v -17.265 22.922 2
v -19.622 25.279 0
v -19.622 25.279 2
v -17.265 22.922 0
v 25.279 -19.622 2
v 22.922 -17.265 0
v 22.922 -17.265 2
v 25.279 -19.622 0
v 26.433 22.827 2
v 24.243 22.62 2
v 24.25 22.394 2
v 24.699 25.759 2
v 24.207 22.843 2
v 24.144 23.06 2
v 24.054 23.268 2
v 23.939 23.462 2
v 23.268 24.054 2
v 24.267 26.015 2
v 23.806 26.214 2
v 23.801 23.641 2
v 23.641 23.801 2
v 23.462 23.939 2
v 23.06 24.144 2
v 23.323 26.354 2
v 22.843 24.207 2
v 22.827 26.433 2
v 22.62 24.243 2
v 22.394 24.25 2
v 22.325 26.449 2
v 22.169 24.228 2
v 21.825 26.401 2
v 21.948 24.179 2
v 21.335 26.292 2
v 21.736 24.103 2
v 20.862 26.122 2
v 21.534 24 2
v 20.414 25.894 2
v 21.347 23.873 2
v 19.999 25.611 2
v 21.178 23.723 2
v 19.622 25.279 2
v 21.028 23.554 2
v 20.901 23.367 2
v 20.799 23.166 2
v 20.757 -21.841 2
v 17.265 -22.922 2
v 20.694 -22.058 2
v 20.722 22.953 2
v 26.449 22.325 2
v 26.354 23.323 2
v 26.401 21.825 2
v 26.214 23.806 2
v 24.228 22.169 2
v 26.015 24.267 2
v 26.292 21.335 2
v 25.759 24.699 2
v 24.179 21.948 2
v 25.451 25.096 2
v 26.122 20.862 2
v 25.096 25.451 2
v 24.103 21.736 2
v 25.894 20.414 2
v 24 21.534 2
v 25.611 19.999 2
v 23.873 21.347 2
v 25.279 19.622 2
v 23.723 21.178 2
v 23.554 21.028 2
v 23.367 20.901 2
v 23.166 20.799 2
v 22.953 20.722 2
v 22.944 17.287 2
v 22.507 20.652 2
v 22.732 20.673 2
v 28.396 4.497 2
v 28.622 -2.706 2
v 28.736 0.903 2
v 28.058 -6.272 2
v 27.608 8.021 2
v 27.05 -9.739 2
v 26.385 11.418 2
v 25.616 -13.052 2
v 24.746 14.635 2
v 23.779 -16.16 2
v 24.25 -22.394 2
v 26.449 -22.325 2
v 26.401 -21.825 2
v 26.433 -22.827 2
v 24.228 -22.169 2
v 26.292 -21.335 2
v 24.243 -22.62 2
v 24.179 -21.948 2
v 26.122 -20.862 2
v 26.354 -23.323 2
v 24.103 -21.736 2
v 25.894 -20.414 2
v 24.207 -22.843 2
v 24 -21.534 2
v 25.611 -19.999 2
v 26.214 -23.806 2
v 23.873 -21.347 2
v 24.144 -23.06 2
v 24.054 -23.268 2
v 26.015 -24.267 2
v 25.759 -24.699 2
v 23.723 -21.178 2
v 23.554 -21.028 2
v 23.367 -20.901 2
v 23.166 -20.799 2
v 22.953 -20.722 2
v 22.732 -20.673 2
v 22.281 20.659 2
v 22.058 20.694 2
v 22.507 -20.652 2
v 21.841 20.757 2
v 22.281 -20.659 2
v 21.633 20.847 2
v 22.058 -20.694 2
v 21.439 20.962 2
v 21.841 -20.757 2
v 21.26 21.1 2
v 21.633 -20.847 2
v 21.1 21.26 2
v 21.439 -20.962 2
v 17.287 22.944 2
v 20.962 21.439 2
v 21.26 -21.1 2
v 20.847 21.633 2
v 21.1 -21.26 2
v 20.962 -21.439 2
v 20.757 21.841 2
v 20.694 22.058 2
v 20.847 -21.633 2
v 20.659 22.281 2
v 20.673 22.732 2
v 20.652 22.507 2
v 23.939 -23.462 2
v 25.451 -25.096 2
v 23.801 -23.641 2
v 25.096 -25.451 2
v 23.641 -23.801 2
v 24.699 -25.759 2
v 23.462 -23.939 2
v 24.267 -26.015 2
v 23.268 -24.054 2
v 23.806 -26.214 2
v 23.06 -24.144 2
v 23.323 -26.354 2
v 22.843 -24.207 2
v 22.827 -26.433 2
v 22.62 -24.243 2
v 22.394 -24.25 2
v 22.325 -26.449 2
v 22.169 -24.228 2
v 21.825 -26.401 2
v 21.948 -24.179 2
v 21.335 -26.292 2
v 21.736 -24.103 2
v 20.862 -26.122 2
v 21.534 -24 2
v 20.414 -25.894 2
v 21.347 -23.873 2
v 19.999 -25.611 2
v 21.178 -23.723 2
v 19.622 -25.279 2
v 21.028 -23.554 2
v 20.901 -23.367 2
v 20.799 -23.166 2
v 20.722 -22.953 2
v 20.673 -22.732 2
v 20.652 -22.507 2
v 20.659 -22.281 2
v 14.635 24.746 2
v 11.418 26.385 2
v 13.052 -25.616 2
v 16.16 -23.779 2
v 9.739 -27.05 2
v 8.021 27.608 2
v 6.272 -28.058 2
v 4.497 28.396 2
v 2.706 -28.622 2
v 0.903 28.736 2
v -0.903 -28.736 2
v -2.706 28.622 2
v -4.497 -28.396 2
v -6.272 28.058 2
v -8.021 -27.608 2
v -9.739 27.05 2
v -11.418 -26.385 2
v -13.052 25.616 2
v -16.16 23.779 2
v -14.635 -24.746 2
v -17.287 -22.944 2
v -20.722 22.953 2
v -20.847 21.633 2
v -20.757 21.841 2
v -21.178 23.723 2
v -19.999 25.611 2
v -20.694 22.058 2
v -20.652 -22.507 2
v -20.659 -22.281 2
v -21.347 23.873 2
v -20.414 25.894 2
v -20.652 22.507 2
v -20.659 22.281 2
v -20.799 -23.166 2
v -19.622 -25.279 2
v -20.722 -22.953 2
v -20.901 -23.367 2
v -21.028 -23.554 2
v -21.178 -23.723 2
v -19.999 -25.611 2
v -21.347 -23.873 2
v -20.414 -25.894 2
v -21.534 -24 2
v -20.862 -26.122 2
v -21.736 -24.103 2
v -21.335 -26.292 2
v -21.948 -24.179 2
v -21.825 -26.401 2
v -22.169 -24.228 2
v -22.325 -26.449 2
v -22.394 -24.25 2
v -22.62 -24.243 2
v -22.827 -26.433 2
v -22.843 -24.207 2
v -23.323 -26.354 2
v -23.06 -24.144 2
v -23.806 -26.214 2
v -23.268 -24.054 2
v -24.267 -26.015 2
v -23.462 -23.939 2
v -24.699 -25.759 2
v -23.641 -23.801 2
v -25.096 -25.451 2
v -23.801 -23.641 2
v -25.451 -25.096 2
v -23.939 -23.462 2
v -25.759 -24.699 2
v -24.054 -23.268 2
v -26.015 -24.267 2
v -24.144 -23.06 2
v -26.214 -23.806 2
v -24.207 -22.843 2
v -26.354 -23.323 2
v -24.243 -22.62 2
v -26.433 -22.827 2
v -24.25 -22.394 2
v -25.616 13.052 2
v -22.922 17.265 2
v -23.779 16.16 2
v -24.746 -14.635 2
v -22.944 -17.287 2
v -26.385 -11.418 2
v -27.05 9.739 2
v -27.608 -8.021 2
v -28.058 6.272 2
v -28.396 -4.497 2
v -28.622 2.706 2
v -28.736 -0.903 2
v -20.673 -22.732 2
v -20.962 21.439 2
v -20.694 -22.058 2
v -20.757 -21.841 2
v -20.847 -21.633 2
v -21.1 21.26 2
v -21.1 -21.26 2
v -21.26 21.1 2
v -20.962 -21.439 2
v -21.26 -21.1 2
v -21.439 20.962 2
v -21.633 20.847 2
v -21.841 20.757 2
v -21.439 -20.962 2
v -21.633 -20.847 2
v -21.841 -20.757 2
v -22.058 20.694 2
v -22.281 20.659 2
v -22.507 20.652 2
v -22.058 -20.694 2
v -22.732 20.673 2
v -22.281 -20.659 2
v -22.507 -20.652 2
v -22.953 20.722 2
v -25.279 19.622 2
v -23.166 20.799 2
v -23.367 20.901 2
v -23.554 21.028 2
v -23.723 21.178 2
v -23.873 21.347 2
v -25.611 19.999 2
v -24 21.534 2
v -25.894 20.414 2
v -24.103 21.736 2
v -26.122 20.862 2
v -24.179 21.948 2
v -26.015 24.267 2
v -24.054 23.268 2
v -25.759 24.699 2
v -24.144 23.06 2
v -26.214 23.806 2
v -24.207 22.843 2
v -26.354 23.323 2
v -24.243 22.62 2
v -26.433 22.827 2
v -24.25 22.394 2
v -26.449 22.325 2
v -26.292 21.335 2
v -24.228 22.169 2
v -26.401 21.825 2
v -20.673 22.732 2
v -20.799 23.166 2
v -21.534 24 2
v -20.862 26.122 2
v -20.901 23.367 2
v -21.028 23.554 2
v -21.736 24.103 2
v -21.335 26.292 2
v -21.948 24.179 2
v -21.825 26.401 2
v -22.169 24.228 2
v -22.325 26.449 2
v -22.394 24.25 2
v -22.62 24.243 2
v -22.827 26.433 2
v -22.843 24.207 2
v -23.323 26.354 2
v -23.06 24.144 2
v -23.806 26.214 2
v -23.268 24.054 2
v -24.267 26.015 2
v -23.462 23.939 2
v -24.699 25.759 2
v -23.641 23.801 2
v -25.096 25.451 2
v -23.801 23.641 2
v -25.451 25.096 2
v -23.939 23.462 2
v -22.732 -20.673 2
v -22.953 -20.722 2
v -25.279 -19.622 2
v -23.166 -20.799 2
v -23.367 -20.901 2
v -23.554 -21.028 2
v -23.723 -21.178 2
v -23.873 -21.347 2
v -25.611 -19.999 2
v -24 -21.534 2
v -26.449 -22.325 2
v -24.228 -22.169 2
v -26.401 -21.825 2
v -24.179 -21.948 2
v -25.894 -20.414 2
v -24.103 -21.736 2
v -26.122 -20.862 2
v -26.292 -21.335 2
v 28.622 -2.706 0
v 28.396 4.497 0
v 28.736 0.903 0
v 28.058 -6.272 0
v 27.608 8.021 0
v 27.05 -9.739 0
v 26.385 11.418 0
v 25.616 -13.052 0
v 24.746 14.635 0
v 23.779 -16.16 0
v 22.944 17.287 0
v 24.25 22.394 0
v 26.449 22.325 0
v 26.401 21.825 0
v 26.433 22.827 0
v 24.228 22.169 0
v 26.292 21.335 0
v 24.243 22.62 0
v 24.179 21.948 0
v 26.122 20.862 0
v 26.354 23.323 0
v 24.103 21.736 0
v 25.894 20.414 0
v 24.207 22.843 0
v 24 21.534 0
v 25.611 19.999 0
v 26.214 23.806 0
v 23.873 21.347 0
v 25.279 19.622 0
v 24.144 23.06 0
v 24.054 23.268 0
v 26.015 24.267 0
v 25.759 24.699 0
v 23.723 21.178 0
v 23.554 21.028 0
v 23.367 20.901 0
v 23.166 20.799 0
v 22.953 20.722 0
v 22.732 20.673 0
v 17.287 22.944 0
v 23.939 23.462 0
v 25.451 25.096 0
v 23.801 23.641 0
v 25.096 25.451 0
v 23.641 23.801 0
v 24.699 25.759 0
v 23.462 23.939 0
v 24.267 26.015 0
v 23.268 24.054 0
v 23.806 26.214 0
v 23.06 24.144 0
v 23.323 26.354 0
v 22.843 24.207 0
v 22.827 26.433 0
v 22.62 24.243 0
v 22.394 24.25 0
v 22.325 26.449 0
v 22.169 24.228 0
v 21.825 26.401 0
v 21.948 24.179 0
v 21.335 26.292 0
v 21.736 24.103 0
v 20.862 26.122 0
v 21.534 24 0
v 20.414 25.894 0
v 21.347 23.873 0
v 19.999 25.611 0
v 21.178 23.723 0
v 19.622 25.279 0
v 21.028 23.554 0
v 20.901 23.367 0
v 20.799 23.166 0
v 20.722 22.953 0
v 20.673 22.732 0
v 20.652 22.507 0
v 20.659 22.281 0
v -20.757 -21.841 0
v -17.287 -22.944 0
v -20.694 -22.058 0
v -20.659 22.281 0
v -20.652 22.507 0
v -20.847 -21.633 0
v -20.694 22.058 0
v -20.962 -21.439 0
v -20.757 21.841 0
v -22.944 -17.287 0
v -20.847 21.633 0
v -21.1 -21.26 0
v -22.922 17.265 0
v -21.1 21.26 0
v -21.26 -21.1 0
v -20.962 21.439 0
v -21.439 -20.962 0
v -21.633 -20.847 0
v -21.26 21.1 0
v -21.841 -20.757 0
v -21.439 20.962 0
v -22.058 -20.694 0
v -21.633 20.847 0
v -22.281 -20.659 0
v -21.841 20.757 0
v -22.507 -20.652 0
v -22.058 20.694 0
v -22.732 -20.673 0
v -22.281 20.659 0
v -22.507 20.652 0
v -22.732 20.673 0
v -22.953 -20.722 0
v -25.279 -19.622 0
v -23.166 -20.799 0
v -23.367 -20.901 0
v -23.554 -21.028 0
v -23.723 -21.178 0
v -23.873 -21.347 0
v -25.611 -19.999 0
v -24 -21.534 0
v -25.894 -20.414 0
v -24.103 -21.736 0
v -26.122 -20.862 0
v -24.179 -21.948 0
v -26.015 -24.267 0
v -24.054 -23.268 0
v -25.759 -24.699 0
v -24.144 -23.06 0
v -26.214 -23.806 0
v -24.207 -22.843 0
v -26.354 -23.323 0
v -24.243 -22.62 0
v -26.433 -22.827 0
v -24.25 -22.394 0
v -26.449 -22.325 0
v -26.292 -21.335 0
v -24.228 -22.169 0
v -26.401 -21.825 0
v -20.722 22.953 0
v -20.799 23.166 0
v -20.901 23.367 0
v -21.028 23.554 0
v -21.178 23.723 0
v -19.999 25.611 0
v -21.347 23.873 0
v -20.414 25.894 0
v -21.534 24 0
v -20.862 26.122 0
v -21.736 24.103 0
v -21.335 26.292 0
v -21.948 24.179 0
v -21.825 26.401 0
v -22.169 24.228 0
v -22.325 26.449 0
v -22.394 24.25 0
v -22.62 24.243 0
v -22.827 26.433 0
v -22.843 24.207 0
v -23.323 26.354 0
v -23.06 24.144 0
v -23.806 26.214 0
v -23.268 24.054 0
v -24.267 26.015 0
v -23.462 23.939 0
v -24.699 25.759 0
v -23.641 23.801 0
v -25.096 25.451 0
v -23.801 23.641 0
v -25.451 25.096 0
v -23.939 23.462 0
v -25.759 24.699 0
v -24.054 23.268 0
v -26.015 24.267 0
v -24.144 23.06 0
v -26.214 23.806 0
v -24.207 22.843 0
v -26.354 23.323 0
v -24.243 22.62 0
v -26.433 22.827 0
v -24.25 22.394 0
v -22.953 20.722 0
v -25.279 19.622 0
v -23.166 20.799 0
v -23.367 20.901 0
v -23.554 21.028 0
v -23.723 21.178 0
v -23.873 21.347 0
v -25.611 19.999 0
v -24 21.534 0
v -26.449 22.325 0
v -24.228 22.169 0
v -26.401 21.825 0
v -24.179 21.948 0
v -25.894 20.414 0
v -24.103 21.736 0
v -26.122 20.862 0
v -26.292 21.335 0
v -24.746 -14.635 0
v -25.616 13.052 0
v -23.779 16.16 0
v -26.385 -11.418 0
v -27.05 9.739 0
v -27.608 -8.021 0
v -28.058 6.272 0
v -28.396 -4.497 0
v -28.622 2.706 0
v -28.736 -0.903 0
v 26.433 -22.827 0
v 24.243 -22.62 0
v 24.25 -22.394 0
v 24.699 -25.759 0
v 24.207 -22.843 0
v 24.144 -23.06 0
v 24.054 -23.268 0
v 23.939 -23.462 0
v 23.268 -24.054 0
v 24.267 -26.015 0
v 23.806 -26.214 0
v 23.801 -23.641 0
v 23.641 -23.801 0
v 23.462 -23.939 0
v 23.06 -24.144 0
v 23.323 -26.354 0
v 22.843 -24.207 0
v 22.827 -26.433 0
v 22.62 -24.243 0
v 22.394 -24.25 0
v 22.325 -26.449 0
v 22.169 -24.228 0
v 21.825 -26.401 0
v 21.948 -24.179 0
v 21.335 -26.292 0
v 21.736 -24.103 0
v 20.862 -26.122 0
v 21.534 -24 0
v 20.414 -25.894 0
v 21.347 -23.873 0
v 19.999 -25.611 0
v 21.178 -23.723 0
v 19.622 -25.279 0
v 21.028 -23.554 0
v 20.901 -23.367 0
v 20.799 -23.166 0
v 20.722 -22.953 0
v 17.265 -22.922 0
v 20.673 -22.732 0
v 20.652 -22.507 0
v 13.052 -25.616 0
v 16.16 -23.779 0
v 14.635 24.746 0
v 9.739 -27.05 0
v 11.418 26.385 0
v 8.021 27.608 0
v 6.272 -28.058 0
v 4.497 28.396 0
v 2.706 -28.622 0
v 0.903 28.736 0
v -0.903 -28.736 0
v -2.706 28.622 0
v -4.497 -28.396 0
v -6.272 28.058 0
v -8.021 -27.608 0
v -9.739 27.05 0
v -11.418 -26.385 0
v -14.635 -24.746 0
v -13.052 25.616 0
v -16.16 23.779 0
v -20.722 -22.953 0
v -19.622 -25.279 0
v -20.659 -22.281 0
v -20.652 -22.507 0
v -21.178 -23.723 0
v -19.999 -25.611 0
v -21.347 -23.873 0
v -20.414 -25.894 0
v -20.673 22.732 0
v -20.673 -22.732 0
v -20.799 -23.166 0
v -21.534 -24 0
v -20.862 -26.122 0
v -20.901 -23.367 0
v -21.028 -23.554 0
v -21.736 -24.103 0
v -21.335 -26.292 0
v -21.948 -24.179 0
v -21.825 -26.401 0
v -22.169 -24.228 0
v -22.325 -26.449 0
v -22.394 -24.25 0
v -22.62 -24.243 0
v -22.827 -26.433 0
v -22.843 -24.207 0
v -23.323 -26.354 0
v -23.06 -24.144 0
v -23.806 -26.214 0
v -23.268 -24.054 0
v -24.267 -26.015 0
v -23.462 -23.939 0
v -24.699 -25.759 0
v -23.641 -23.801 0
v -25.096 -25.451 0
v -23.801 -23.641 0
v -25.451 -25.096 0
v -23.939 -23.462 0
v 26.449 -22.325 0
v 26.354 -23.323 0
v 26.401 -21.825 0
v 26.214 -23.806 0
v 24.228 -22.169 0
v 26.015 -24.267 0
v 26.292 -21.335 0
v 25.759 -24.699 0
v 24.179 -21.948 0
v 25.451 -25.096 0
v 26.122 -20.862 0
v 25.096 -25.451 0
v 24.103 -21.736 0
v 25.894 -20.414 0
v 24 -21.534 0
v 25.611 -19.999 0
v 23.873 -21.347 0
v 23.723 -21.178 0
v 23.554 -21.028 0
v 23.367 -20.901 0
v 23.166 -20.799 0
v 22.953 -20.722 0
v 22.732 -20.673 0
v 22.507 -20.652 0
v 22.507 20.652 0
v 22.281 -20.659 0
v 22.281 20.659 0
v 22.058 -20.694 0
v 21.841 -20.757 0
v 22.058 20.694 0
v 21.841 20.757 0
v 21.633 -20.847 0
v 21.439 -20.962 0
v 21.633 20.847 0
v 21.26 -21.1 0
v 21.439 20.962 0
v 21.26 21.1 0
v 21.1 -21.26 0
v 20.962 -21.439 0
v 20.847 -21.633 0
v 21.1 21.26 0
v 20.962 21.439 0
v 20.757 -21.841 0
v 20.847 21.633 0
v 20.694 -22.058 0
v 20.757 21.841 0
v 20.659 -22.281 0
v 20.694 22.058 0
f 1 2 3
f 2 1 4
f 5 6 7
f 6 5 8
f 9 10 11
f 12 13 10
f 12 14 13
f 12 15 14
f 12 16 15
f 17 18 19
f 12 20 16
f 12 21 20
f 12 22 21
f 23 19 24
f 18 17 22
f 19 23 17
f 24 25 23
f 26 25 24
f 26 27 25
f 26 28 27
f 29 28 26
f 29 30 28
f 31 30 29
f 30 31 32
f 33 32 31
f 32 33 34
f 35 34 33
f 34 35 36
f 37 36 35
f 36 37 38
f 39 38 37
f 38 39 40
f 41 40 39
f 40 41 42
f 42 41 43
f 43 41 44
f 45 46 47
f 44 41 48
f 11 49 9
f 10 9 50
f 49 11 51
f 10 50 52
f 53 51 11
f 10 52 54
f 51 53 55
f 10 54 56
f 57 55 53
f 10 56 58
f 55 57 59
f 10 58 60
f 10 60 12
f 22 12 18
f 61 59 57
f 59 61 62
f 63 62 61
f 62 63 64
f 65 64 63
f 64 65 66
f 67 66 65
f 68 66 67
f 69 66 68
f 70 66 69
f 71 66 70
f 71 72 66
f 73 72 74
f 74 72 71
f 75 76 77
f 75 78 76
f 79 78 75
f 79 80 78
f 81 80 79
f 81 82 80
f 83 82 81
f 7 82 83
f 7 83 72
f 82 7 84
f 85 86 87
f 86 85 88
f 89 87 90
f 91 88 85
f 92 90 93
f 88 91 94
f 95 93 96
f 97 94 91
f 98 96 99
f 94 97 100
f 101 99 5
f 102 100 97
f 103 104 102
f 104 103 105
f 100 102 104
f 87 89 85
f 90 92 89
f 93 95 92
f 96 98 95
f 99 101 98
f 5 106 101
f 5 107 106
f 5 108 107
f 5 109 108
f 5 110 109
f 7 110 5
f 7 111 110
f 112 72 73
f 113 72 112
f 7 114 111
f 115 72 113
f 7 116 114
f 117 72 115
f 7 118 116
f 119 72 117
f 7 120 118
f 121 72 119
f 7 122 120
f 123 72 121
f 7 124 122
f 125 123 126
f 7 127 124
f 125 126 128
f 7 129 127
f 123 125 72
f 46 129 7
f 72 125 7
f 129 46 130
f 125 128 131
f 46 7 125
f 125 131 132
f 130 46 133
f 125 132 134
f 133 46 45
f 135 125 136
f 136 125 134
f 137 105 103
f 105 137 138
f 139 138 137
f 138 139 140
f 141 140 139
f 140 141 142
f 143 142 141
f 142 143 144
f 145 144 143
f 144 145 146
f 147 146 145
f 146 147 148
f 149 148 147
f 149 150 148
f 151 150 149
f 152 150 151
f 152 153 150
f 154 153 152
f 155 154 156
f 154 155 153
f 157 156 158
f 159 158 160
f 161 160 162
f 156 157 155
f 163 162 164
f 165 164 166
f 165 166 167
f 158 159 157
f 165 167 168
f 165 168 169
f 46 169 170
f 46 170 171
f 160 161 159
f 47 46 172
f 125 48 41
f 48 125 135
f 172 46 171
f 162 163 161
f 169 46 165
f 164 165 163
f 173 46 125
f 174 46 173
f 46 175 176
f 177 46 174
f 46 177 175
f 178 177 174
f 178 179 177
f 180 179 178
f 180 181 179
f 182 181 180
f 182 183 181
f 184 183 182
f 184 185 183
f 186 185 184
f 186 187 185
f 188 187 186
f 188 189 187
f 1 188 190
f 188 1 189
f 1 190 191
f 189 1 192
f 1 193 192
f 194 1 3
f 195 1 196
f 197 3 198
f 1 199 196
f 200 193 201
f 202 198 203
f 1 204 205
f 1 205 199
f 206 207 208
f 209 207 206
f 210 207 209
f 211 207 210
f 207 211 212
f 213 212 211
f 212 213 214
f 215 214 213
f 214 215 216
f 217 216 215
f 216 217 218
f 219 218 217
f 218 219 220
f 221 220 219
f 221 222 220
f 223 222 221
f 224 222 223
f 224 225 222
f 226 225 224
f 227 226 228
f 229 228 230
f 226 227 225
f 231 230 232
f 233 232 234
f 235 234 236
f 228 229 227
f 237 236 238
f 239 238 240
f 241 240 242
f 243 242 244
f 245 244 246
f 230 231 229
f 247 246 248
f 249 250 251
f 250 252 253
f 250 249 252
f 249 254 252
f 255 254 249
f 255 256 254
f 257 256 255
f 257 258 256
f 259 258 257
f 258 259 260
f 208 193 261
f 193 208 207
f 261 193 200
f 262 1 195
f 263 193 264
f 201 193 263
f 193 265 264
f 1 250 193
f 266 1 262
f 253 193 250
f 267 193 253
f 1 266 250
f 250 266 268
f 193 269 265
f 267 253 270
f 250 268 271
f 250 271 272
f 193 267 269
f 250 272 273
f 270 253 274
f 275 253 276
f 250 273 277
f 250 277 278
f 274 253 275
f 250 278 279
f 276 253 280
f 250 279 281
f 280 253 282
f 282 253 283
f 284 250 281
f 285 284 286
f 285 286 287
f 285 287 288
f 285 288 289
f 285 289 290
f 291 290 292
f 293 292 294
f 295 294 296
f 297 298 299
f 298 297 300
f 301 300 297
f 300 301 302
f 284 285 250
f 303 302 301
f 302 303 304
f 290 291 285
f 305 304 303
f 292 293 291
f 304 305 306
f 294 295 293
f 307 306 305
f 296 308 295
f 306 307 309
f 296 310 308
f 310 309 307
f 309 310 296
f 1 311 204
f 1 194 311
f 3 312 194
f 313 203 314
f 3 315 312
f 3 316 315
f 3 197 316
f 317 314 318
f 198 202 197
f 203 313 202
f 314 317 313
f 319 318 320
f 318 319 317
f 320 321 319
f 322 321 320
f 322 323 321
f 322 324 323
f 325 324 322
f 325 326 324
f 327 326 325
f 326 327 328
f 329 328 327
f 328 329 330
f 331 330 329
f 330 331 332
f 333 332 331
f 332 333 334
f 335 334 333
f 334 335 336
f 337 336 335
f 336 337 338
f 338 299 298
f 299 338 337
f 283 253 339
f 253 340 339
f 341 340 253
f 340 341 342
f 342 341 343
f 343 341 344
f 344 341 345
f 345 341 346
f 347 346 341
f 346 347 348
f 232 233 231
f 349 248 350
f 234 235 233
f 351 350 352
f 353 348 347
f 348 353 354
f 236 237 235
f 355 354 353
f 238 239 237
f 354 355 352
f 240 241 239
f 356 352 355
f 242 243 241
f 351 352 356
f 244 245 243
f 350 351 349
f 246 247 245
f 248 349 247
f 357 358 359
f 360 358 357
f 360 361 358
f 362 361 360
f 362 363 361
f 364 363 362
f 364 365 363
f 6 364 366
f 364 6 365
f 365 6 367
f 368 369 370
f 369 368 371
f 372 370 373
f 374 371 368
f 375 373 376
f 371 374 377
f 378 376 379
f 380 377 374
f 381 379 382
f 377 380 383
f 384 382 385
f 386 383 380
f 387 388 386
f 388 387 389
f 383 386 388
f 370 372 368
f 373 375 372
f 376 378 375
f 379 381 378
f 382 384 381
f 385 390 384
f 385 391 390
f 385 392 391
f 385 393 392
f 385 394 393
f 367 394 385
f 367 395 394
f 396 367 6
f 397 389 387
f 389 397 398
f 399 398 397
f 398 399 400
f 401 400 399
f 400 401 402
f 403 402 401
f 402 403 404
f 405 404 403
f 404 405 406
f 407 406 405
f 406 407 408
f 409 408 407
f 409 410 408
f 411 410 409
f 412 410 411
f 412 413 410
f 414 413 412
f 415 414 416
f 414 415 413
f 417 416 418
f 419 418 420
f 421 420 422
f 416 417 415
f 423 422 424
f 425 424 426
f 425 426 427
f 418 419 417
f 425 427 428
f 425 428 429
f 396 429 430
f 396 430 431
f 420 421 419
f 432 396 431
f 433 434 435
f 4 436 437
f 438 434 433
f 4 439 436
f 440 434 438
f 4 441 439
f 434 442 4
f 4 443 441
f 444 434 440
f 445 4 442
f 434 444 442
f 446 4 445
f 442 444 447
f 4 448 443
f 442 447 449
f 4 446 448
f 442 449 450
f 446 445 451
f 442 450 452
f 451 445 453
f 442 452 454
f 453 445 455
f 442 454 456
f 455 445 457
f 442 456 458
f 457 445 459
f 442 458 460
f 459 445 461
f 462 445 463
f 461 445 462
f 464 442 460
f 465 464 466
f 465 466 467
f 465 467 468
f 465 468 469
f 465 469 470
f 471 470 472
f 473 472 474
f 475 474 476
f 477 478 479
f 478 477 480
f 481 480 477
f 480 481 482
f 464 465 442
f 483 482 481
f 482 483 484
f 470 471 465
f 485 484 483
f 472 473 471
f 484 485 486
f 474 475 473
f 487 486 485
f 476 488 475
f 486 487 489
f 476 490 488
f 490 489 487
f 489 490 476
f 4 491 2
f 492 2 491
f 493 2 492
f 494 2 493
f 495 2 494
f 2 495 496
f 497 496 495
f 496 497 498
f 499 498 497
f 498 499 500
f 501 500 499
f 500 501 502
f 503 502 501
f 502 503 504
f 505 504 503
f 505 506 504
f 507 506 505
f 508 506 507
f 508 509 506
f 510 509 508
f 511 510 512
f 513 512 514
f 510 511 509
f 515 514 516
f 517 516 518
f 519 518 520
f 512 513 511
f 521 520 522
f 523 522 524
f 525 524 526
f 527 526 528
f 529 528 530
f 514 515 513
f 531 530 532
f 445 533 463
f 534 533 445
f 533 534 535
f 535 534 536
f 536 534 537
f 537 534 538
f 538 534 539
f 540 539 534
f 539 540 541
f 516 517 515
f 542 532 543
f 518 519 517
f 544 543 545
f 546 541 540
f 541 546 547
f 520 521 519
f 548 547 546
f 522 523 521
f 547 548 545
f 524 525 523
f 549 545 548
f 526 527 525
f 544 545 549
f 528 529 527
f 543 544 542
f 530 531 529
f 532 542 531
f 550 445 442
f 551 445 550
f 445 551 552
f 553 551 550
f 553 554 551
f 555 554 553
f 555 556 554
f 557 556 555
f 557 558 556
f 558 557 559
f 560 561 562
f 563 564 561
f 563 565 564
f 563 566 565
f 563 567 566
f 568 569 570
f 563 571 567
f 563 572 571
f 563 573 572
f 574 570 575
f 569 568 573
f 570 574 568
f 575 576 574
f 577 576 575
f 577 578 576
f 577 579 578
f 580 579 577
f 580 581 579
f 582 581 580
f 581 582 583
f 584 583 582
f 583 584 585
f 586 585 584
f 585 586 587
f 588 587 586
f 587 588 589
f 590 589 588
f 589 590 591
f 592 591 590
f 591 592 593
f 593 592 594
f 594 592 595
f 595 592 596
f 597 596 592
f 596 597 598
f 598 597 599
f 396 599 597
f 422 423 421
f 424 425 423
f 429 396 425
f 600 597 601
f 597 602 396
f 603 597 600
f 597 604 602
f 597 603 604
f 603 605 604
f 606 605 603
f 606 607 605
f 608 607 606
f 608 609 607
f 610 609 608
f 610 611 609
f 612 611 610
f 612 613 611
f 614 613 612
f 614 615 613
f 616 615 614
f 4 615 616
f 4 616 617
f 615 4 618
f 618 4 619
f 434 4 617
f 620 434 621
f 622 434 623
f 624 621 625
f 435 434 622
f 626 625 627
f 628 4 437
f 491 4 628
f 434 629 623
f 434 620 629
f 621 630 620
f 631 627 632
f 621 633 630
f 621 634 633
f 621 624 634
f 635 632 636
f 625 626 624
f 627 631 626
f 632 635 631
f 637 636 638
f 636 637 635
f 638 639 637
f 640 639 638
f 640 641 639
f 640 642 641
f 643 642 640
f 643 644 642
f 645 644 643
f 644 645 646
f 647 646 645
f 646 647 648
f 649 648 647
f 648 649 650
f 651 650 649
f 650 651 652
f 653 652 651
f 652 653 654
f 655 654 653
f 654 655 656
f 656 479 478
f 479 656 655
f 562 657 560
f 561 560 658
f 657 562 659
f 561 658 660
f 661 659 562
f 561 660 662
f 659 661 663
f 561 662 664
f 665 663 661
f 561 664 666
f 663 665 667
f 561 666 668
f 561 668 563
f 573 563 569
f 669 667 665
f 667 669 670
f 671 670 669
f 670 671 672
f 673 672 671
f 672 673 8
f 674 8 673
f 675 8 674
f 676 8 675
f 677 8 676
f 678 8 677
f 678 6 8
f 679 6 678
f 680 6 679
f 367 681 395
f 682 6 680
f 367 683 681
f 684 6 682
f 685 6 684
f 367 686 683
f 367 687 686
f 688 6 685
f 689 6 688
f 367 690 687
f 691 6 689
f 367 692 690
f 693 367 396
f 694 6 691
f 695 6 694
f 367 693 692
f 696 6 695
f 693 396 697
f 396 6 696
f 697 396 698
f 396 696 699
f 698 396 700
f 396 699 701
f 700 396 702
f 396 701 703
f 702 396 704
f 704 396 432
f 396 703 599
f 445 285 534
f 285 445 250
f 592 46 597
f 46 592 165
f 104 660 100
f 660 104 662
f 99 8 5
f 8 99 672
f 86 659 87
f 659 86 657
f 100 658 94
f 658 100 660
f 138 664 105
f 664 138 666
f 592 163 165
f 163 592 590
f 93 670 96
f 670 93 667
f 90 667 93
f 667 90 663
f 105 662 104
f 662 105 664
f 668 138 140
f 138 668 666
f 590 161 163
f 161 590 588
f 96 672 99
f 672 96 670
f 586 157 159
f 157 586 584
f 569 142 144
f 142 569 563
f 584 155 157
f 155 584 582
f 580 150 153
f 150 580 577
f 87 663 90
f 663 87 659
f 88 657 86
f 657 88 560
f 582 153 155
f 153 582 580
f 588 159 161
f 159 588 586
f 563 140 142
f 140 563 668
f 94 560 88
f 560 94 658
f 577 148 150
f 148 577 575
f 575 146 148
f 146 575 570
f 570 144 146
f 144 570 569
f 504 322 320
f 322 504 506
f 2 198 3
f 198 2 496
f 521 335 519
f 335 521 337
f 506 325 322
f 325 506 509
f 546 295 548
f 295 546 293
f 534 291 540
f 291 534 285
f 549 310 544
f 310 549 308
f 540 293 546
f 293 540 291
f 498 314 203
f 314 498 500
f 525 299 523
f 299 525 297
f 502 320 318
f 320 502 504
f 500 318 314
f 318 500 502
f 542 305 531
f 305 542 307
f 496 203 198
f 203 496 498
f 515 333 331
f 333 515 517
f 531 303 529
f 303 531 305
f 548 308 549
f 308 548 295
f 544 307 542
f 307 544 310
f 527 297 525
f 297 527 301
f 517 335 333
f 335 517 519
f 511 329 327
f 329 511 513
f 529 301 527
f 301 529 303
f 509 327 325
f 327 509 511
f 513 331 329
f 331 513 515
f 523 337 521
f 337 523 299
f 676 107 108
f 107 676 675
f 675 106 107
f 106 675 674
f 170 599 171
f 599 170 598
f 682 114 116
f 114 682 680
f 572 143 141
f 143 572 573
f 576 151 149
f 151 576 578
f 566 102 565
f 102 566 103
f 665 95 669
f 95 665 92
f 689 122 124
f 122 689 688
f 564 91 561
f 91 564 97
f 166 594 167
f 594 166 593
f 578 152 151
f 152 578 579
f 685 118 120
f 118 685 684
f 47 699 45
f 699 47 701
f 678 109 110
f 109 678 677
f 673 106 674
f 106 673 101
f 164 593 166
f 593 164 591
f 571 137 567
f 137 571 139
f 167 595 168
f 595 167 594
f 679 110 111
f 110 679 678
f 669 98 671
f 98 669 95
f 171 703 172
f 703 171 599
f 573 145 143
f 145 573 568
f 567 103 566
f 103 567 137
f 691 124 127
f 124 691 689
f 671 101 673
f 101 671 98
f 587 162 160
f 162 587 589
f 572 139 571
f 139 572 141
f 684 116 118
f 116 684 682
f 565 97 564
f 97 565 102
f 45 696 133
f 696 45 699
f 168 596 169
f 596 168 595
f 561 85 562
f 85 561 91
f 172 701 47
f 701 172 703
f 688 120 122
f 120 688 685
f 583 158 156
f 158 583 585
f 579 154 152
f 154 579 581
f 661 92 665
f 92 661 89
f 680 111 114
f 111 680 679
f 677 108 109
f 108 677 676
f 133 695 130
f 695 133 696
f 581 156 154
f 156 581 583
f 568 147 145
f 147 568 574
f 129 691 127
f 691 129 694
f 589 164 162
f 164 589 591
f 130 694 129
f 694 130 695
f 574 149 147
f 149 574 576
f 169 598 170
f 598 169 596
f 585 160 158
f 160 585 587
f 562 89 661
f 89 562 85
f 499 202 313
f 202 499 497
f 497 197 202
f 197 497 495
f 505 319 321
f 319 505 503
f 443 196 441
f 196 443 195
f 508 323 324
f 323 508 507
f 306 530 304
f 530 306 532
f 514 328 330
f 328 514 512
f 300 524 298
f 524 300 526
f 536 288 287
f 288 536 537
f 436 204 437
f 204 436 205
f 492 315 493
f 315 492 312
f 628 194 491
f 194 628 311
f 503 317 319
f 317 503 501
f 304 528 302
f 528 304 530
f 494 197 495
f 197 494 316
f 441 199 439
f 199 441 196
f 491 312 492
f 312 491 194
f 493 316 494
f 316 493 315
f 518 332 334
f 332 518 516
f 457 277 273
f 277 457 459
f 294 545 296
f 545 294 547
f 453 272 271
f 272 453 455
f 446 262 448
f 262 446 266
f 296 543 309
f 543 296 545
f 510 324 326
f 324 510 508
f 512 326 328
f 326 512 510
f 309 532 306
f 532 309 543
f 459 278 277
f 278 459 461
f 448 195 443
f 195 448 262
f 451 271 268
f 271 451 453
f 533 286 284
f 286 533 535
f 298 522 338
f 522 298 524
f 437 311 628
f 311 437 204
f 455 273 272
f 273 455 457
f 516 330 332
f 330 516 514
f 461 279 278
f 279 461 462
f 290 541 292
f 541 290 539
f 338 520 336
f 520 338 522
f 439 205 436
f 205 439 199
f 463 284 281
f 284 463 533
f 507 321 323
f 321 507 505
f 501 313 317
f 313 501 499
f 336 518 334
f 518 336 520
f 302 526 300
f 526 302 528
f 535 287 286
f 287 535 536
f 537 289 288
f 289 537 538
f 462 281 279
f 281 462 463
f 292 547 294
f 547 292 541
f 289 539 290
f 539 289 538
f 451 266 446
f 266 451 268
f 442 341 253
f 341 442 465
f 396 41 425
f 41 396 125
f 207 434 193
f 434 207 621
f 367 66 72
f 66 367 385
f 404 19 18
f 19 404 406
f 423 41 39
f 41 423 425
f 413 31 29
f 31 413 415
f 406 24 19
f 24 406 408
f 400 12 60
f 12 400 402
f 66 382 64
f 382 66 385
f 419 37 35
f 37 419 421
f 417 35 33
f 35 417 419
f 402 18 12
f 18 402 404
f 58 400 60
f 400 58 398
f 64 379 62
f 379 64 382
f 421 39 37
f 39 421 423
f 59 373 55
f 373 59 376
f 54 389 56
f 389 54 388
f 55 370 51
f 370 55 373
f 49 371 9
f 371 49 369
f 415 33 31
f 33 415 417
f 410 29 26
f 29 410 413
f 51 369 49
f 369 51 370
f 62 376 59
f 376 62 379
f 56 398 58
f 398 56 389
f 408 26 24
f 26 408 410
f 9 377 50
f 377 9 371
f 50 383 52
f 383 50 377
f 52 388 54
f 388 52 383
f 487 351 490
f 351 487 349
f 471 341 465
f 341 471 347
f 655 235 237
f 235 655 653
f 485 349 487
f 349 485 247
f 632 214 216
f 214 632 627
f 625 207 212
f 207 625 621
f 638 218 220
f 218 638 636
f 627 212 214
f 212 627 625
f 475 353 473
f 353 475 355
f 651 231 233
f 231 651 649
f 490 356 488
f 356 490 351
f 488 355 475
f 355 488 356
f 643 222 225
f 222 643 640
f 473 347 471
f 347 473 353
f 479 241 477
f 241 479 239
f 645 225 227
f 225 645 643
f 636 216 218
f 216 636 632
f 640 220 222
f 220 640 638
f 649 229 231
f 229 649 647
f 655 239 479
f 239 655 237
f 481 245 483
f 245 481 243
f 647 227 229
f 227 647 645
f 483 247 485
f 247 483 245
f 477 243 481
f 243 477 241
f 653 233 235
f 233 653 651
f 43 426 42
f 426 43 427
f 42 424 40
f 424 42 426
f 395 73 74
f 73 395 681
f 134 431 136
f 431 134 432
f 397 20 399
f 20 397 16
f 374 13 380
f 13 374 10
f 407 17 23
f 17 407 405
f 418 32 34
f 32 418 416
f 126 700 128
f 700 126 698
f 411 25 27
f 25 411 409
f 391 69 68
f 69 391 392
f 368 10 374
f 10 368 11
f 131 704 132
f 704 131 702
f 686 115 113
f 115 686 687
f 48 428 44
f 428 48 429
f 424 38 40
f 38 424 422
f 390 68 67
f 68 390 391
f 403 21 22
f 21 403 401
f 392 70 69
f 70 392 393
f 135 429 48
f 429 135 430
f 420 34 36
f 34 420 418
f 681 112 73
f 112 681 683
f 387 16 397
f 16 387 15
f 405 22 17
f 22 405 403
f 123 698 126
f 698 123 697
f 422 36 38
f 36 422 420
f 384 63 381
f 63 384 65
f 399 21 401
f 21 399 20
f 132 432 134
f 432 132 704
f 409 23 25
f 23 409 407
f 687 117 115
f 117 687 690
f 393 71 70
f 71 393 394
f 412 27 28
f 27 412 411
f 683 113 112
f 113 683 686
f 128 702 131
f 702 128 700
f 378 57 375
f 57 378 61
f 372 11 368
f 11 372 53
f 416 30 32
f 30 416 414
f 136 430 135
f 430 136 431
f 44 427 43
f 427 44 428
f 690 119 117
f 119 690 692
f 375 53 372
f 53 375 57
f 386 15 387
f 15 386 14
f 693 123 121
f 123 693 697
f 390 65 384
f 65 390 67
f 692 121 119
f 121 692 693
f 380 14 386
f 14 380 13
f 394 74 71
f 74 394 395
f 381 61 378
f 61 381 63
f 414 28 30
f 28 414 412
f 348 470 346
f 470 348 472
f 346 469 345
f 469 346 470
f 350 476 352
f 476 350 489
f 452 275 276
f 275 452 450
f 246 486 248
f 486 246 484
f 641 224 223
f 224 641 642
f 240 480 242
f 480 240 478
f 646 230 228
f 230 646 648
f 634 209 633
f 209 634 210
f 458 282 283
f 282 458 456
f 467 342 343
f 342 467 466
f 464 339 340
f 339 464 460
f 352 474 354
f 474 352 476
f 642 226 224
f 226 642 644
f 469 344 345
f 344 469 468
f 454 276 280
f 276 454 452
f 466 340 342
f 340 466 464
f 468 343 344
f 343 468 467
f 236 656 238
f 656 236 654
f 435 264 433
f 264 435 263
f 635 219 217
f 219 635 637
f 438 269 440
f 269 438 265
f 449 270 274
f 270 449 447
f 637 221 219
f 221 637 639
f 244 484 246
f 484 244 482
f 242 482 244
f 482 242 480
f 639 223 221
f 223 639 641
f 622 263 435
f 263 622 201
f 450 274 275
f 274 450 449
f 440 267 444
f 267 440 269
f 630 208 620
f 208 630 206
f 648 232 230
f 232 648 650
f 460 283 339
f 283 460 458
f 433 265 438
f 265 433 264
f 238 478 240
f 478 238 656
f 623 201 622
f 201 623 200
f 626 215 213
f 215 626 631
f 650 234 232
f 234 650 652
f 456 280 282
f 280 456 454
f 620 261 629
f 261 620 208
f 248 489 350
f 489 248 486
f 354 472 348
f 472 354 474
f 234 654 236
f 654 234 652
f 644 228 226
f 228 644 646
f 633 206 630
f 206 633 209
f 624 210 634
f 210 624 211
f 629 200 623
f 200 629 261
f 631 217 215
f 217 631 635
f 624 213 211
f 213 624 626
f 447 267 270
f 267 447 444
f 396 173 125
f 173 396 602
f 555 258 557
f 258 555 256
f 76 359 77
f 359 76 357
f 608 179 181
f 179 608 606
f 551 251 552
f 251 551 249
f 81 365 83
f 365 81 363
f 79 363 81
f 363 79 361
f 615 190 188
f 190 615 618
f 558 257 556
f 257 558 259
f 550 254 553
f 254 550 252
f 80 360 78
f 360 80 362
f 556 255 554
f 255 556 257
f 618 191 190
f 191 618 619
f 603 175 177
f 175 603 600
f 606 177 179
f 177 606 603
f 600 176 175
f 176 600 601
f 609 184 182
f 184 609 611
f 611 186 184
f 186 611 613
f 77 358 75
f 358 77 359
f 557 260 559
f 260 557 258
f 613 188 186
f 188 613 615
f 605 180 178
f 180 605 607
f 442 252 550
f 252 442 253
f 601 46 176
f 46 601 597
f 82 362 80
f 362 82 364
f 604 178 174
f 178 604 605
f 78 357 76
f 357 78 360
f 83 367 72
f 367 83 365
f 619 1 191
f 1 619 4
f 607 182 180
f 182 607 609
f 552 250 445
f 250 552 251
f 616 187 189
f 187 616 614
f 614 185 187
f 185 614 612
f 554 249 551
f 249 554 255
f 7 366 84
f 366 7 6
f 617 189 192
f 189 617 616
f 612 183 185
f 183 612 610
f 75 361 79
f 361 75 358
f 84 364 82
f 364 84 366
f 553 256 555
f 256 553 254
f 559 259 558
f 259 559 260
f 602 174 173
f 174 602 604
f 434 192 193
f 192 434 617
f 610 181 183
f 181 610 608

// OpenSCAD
$fn = 50;
cover_thickness = 2;
tube_thickness = 2;
pcb_disk_r = 53.5/2;
cover_disk_r = 54.5/2;
cover_r = pcb_disk_r+tube_thickness;
peg_thickness = 2;

module stick_with_holes() {
  clen = 5;
  cwidth = 8;
  translate([-cwidth/2, -pcb_disk_r-clen, 0]) {
   difference() {
      union() {
        cube([cwidth, (pcb_disk_r + clen) * 2, cover_thickness]);
        translate([cwidth/2, 0,  0]) {
          cylinder(r=cwidth/2, h=cover_thickness);
        }
        translate([cwidth/2, (pcb_disk_r+clen)*2,  0]) {
          cylinder(r=cwidth/2, h=cover_thickness);
        }
      }
      translate([cwidth/2, 0,  0]) {
        cylinder(r=1.8, h=cover_thickness);
      }
      translate([cwidth/2, (pcb_disk_r+clen)*2,  0]) {
        cylinder(r=1.8, h=cover_thickness);
      }
    }
  }
}


translate([0, 0, 0]) {
  rotate(45) {
    cylinder(h=cover_thickness, r=cover_r);
    stick_with_holes();
    rotate(90) {
      stick_with_holes();
    }
  }
}
